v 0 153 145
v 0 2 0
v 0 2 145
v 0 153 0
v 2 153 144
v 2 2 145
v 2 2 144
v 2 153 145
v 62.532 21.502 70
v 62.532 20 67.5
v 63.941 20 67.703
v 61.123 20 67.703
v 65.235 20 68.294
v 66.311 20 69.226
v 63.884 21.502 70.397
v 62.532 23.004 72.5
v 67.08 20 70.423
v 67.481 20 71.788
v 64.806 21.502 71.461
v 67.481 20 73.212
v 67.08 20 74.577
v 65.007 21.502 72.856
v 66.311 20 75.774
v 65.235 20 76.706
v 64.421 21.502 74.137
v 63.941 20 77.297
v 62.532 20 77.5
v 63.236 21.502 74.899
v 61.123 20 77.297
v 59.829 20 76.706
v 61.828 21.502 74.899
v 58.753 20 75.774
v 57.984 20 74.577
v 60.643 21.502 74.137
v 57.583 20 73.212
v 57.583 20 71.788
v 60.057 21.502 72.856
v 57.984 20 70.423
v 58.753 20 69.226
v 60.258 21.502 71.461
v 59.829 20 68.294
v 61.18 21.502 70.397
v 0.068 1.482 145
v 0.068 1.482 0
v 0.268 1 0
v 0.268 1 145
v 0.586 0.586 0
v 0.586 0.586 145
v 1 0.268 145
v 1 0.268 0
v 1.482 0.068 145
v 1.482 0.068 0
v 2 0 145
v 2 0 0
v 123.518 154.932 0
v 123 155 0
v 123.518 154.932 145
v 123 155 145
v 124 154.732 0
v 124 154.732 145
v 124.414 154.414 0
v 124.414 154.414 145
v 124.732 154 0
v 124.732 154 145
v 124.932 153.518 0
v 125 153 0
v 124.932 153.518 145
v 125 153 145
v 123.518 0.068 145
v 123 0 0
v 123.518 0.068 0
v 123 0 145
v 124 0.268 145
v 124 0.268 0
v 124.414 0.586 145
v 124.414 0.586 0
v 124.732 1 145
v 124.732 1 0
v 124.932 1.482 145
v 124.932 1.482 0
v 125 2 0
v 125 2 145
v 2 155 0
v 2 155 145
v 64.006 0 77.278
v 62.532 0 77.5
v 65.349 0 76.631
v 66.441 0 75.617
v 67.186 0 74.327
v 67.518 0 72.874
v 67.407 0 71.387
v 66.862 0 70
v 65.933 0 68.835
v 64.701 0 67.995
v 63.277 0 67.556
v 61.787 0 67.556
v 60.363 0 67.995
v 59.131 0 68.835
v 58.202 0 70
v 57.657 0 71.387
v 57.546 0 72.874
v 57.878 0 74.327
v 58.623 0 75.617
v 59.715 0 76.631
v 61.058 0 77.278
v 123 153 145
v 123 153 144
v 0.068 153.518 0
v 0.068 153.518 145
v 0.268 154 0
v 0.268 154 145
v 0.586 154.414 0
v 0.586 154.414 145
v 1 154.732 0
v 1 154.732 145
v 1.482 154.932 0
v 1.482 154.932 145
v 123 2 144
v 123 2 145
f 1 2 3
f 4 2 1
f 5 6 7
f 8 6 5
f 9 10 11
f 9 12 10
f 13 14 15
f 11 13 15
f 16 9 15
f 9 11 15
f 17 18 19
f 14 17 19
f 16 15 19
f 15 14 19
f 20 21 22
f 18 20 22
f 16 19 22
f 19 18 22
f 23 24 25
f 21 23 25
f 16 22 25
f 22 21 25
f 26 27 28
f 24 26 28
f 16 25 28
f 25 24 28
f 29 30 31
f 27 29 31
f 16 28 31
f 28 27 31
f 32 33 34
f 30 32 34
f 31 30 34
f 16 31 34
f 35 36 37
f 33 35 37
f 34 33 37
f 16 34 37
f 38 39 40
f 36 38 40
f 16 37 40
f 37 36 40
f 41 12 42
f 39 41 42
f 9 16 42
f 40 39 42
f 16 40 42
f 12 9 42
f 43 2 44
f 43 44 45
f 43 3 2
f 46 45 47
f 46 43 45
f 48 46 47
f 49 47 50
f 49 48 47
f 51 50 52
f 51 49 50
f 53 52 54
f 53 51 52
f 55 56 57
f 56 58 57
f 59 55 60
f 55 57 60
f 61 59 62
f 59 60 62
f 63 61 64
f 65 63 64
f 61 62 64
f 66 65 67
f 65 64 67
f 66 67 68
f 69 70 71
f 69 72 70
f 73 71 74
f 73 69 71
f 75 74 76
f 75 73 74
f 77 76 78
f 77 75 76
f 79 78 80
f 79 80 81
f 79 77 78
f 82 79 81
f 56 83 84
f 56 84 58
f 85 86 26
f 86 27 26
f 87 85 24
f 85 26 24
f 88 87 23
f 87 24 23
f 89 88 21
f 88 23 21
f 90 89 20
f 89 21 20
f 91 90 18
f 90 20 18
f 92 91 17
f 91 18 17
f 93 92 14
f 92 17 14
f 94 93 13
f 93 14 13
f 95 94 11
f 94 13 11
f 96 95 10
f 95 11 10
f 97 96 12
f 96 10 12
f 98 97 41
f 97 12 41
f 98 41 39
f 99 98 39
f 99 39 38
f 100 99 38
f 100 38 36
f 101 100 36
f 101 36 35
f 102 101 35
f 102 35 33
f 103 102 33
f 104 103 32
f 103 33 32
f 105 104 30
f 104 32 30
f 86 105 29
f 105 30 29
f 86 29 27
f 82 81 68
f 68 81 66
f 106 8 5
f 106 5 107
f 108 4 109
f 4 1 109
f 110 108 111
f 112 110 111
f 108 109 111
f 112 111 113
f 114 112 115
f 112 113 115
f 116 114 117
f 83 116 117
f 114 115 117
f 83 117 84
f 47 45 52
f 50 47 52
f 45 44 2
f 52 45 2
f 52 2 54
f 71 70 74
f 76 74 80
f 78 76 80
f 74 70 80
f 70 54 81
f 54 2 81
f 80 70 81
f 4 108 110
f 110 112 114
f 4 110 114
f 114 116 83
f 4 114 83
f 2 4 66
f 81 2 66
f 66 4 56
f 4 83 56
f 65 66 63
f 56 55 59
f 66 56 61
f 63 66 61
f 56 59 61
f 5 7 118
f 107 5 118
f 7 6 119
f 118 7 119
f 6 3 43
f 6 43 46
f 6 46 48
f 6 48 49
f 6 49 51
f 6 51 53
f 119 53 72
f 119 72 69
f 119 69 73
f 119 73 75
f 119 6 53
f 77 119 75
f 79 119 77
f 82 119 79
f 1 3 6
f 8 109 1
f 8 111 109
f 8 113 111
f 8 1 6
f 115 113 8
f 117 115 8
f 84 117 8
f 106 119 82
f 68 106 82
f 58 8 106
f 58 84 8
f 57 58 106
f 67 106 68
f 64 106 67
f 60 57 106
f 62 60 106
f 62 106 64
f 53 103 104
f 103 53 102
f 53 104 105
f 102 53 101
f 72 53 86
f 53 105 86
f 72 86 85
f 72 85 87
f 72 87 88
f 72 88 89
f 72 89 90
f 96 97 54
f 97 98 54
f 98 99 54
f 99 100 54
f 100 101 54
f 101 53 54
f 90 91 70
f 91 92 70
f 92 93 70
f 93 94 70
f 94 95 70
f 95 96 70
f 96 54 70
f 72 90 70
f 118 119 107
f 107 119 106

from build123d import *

# Parameters (mm, degrees)
SKETCH1_W                  = 125
SKETCH1_H                  = 155
BOSS_EXTRUDE1_DEPTH        = 145
SKETCH2_W                  = 121
SKETCH2_H                  = 151
CUT_EXTRUDE1_DEPTH         = 1
FILLET1_R                  = 2
FILLET2_R                  = 2
F_10_0MM_DOWEL_HOLE1_D     = 10
F_10_0MM_DOWEL_HOLE1_DEPTH = 20
F_10_0MM_DOWEL_HOLE1_TIP   = 3.004303095


with BuildPart() as part:
    # Sketch1 → Boss-Extrude1 (new body)
    with BuildSketch(Plane.XY):
        with Locations((62.5, 77.5)):
            Rectangle(SKETCH1_W, SKETCH1_H)
    extrude(amount=BOSS_EXTRUDE1_DEPTH)

    # Sketch2 → Cut-Extrude1 (cut)
    with BuildSketch(Plane.XY.offset(145)):
        with Locations((62.5, 77.5)):
            Rectangle(SKETCH2_W, SKETCH2_H)
    extrude(amount=-CUT_EXTRUDE1_DEPTH, mode=Mode.SUBTRACT)

    # Fillet1
    fillet1_edges = [part.edges().sort_by_distance(p)[0] for p in [
        (0, 155, 72.5),
        (125, 155, 72.5),
        (0, 0, 72.5),
    ]]
    fillet(fillet1_edges, radius=FILLET1_R)

    # Fillet2
    fillet2_edges = [part.edges().sort_by_distance(p)[0] for p in [
        (125, 0, 72.5),
    ]]
    fillet(fillet2_edges, radius=FILLET2_R)

    # Ø10.0mm Dowel Hole1
    with Locations(Plane(origin=(62.532008196, 0, 72.5), x_dir=(0, 0, -1), z_dir=(0, -1, 0))):
        with Locations((0, 0)):
            Hole(F_10_0MM_DOWEL_HOLE1_D / 2, depth=F_10_0MM_DOWEL_HOLE1_DEPTH)
            with Locations((0, 0, -(F_10_0MM_DOWEL_HOLE1_DEPTH + F_10_0MM_DOWEL_HOLE1_TIP / 2))):  # 118° drill point
                Cone(0, F_10_0MM_DOWEL_HOLE1_D / 2, F_10_0MM_DOWEL_HOLE1_TIP, mode=Mode.SUBTRACT)


solid = part.part
